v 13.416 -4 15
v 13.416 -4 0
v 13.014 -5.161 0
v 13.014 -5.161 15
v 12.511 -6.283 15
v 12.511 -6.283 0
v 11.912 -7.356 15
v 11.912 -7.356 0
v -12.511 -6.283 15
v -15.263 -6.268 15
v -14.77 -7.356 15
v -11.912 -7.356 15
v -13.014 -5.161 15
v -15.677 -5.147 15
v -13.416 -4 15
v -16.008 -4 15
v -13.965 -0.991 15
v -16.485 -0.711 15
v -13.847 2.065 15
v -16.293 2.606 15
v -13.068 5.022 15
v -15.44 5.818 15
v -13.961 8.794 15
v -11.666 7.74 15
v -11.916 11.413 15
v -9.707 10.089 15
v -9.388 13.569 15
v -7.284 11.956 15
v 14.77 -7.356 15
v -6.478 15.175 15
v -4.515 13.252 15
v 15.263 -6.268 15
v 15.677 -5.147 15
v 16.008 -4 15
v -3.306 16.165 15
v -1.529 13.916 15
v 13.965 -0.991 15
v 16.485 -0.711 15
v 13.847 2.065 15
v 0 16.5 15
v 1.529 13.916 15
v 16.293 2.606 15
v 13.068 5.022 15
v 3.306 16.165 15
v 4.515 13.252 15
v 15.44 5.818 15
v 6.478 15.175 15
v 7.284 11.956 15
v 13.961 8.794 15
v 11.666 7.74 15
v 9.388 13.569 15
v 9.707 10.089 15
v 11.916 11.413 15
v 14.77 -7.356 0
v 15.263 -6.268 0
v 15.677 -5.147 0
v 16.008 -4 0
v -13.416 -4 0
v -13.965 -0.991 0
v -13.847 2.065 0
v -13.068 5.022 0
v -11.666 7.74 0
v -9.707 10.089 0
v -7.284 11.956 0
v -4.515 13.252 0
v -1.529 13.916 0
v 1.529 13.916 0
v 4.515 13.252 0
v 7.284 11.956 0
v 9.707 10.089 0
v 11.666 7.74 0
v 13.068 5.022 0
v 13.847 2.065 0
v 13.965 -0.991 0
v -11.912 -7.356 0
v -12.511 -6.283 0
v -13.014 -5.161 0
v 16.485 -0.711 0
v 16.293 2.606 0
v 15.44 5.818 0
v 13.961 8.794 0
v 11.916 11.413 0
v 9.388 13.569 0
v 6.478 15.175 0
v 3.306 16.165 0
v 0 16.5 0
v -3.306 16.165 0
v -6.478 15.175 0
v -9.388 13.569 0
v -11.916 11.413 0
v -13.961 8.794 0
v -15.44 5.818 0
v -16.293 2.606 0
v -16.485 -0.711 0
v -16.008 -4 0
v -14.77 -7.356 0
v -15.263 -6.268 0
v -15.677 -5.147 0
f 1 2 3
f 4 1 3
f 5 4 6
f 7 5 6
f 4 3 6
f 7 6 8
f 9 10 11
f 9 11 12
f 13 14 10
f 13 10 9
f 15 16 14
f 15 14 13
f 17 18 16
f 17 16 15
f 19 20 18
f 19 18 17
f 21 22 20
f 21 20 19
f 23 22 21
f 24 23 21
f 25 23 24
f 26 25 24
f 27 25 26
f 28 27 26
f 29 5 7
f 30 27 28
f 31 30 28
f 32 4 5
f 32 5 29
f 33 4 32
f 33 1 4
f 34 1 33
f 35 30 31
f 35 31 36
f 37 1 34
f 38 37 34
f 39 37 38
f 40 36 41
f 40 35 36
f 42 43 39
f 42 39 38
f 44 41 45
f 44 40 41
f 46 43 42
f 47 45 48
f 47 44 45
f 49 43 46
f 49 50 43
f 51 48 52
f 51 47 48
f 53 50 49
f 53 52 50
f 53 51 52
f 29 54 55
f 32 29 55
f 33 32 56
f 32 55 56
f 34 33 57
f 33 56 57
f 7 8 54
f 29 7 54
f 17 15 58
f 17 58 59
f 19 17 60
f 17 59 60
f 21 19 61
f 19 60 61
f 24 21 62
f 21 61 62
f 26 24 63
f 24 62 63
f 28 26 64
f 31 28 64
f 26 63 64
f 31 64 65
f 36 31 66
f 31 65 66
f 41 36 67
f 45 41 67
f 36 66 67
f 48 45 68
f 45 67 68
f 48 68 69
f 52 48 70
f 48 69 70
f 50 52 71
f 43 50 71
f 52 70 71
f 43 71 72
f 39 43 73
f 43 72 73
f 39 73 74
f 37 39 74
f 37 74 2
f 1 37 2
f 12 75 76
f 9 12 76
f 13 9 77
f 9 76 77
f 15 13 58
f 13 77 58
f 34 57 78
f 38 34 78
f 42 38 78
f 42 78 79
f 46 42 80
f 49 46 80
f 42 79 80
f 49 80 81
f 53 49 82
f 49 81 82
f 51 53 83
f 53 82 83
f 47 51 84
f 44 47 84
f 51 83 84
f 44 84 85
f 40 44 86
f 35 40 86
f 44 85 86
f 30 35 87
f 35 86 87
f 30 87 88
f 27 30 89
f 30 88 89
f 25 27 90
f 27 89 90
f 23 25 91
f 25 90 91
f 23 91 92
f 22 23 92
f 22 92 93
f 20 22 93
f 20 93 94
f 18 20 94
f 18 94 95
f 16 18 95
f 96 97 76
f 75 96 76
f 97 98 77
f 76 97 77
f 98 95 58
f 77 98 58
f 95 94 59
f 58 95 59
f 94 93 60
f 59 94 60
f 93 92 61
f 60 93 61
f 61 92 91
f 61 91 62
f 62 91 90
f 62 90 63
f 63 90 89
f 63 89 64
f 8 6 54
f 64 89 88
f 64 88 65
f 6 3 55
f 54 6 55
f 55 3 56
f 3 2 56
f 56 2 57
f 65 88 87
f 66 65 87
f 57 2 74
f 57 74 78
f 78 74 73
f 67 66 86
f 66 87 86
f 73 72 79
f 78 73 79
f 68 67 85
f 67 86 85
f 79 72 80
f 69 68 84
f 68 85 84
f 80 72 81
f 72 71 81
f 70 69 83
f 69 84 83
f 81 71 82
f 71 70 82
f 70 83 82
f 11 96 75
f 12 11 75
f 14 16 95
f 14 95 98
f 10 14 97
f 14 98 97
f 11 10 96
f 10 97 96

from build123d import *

# Parameters (mm, degrees)
F1_DEPTH = 15


with BuildPart() as f1:
    # F0 (on Top) → F1 (new body)
    with BuildSketch(Plane.XY):
        with BuildLine():
            ThreePointArc((-13.416408, -4), (0, 14), (13.416408, -4))
            ThreePointArc((13.416408, -4), (12.774857, -5.727392), (11.911998, -7.355563))
            Line((11.911998, -7.355563), (14.769756, -7.355563))
            ThreePointArc((14.769756, -7.355563), (15.479974, -5.711427), (16.007811, -4))
            ThreePointArc((16.007811, -4), (0, 16.5), (-16.007811, -4))
            ThreePointArc((-16.007811, -4), (-15.479974, -5.711427), (-14.769756, -7.355563))
            Line((-14.769756, -7.355563), (-11.911998, -7.355563))
            ThreePointArc((-11.911998, -7.355563), (-12.774857, -5.727392), (-13.416408, -4))
        make_face()
    extrude(amount=F1_DEPTH)


solid = f1.part
